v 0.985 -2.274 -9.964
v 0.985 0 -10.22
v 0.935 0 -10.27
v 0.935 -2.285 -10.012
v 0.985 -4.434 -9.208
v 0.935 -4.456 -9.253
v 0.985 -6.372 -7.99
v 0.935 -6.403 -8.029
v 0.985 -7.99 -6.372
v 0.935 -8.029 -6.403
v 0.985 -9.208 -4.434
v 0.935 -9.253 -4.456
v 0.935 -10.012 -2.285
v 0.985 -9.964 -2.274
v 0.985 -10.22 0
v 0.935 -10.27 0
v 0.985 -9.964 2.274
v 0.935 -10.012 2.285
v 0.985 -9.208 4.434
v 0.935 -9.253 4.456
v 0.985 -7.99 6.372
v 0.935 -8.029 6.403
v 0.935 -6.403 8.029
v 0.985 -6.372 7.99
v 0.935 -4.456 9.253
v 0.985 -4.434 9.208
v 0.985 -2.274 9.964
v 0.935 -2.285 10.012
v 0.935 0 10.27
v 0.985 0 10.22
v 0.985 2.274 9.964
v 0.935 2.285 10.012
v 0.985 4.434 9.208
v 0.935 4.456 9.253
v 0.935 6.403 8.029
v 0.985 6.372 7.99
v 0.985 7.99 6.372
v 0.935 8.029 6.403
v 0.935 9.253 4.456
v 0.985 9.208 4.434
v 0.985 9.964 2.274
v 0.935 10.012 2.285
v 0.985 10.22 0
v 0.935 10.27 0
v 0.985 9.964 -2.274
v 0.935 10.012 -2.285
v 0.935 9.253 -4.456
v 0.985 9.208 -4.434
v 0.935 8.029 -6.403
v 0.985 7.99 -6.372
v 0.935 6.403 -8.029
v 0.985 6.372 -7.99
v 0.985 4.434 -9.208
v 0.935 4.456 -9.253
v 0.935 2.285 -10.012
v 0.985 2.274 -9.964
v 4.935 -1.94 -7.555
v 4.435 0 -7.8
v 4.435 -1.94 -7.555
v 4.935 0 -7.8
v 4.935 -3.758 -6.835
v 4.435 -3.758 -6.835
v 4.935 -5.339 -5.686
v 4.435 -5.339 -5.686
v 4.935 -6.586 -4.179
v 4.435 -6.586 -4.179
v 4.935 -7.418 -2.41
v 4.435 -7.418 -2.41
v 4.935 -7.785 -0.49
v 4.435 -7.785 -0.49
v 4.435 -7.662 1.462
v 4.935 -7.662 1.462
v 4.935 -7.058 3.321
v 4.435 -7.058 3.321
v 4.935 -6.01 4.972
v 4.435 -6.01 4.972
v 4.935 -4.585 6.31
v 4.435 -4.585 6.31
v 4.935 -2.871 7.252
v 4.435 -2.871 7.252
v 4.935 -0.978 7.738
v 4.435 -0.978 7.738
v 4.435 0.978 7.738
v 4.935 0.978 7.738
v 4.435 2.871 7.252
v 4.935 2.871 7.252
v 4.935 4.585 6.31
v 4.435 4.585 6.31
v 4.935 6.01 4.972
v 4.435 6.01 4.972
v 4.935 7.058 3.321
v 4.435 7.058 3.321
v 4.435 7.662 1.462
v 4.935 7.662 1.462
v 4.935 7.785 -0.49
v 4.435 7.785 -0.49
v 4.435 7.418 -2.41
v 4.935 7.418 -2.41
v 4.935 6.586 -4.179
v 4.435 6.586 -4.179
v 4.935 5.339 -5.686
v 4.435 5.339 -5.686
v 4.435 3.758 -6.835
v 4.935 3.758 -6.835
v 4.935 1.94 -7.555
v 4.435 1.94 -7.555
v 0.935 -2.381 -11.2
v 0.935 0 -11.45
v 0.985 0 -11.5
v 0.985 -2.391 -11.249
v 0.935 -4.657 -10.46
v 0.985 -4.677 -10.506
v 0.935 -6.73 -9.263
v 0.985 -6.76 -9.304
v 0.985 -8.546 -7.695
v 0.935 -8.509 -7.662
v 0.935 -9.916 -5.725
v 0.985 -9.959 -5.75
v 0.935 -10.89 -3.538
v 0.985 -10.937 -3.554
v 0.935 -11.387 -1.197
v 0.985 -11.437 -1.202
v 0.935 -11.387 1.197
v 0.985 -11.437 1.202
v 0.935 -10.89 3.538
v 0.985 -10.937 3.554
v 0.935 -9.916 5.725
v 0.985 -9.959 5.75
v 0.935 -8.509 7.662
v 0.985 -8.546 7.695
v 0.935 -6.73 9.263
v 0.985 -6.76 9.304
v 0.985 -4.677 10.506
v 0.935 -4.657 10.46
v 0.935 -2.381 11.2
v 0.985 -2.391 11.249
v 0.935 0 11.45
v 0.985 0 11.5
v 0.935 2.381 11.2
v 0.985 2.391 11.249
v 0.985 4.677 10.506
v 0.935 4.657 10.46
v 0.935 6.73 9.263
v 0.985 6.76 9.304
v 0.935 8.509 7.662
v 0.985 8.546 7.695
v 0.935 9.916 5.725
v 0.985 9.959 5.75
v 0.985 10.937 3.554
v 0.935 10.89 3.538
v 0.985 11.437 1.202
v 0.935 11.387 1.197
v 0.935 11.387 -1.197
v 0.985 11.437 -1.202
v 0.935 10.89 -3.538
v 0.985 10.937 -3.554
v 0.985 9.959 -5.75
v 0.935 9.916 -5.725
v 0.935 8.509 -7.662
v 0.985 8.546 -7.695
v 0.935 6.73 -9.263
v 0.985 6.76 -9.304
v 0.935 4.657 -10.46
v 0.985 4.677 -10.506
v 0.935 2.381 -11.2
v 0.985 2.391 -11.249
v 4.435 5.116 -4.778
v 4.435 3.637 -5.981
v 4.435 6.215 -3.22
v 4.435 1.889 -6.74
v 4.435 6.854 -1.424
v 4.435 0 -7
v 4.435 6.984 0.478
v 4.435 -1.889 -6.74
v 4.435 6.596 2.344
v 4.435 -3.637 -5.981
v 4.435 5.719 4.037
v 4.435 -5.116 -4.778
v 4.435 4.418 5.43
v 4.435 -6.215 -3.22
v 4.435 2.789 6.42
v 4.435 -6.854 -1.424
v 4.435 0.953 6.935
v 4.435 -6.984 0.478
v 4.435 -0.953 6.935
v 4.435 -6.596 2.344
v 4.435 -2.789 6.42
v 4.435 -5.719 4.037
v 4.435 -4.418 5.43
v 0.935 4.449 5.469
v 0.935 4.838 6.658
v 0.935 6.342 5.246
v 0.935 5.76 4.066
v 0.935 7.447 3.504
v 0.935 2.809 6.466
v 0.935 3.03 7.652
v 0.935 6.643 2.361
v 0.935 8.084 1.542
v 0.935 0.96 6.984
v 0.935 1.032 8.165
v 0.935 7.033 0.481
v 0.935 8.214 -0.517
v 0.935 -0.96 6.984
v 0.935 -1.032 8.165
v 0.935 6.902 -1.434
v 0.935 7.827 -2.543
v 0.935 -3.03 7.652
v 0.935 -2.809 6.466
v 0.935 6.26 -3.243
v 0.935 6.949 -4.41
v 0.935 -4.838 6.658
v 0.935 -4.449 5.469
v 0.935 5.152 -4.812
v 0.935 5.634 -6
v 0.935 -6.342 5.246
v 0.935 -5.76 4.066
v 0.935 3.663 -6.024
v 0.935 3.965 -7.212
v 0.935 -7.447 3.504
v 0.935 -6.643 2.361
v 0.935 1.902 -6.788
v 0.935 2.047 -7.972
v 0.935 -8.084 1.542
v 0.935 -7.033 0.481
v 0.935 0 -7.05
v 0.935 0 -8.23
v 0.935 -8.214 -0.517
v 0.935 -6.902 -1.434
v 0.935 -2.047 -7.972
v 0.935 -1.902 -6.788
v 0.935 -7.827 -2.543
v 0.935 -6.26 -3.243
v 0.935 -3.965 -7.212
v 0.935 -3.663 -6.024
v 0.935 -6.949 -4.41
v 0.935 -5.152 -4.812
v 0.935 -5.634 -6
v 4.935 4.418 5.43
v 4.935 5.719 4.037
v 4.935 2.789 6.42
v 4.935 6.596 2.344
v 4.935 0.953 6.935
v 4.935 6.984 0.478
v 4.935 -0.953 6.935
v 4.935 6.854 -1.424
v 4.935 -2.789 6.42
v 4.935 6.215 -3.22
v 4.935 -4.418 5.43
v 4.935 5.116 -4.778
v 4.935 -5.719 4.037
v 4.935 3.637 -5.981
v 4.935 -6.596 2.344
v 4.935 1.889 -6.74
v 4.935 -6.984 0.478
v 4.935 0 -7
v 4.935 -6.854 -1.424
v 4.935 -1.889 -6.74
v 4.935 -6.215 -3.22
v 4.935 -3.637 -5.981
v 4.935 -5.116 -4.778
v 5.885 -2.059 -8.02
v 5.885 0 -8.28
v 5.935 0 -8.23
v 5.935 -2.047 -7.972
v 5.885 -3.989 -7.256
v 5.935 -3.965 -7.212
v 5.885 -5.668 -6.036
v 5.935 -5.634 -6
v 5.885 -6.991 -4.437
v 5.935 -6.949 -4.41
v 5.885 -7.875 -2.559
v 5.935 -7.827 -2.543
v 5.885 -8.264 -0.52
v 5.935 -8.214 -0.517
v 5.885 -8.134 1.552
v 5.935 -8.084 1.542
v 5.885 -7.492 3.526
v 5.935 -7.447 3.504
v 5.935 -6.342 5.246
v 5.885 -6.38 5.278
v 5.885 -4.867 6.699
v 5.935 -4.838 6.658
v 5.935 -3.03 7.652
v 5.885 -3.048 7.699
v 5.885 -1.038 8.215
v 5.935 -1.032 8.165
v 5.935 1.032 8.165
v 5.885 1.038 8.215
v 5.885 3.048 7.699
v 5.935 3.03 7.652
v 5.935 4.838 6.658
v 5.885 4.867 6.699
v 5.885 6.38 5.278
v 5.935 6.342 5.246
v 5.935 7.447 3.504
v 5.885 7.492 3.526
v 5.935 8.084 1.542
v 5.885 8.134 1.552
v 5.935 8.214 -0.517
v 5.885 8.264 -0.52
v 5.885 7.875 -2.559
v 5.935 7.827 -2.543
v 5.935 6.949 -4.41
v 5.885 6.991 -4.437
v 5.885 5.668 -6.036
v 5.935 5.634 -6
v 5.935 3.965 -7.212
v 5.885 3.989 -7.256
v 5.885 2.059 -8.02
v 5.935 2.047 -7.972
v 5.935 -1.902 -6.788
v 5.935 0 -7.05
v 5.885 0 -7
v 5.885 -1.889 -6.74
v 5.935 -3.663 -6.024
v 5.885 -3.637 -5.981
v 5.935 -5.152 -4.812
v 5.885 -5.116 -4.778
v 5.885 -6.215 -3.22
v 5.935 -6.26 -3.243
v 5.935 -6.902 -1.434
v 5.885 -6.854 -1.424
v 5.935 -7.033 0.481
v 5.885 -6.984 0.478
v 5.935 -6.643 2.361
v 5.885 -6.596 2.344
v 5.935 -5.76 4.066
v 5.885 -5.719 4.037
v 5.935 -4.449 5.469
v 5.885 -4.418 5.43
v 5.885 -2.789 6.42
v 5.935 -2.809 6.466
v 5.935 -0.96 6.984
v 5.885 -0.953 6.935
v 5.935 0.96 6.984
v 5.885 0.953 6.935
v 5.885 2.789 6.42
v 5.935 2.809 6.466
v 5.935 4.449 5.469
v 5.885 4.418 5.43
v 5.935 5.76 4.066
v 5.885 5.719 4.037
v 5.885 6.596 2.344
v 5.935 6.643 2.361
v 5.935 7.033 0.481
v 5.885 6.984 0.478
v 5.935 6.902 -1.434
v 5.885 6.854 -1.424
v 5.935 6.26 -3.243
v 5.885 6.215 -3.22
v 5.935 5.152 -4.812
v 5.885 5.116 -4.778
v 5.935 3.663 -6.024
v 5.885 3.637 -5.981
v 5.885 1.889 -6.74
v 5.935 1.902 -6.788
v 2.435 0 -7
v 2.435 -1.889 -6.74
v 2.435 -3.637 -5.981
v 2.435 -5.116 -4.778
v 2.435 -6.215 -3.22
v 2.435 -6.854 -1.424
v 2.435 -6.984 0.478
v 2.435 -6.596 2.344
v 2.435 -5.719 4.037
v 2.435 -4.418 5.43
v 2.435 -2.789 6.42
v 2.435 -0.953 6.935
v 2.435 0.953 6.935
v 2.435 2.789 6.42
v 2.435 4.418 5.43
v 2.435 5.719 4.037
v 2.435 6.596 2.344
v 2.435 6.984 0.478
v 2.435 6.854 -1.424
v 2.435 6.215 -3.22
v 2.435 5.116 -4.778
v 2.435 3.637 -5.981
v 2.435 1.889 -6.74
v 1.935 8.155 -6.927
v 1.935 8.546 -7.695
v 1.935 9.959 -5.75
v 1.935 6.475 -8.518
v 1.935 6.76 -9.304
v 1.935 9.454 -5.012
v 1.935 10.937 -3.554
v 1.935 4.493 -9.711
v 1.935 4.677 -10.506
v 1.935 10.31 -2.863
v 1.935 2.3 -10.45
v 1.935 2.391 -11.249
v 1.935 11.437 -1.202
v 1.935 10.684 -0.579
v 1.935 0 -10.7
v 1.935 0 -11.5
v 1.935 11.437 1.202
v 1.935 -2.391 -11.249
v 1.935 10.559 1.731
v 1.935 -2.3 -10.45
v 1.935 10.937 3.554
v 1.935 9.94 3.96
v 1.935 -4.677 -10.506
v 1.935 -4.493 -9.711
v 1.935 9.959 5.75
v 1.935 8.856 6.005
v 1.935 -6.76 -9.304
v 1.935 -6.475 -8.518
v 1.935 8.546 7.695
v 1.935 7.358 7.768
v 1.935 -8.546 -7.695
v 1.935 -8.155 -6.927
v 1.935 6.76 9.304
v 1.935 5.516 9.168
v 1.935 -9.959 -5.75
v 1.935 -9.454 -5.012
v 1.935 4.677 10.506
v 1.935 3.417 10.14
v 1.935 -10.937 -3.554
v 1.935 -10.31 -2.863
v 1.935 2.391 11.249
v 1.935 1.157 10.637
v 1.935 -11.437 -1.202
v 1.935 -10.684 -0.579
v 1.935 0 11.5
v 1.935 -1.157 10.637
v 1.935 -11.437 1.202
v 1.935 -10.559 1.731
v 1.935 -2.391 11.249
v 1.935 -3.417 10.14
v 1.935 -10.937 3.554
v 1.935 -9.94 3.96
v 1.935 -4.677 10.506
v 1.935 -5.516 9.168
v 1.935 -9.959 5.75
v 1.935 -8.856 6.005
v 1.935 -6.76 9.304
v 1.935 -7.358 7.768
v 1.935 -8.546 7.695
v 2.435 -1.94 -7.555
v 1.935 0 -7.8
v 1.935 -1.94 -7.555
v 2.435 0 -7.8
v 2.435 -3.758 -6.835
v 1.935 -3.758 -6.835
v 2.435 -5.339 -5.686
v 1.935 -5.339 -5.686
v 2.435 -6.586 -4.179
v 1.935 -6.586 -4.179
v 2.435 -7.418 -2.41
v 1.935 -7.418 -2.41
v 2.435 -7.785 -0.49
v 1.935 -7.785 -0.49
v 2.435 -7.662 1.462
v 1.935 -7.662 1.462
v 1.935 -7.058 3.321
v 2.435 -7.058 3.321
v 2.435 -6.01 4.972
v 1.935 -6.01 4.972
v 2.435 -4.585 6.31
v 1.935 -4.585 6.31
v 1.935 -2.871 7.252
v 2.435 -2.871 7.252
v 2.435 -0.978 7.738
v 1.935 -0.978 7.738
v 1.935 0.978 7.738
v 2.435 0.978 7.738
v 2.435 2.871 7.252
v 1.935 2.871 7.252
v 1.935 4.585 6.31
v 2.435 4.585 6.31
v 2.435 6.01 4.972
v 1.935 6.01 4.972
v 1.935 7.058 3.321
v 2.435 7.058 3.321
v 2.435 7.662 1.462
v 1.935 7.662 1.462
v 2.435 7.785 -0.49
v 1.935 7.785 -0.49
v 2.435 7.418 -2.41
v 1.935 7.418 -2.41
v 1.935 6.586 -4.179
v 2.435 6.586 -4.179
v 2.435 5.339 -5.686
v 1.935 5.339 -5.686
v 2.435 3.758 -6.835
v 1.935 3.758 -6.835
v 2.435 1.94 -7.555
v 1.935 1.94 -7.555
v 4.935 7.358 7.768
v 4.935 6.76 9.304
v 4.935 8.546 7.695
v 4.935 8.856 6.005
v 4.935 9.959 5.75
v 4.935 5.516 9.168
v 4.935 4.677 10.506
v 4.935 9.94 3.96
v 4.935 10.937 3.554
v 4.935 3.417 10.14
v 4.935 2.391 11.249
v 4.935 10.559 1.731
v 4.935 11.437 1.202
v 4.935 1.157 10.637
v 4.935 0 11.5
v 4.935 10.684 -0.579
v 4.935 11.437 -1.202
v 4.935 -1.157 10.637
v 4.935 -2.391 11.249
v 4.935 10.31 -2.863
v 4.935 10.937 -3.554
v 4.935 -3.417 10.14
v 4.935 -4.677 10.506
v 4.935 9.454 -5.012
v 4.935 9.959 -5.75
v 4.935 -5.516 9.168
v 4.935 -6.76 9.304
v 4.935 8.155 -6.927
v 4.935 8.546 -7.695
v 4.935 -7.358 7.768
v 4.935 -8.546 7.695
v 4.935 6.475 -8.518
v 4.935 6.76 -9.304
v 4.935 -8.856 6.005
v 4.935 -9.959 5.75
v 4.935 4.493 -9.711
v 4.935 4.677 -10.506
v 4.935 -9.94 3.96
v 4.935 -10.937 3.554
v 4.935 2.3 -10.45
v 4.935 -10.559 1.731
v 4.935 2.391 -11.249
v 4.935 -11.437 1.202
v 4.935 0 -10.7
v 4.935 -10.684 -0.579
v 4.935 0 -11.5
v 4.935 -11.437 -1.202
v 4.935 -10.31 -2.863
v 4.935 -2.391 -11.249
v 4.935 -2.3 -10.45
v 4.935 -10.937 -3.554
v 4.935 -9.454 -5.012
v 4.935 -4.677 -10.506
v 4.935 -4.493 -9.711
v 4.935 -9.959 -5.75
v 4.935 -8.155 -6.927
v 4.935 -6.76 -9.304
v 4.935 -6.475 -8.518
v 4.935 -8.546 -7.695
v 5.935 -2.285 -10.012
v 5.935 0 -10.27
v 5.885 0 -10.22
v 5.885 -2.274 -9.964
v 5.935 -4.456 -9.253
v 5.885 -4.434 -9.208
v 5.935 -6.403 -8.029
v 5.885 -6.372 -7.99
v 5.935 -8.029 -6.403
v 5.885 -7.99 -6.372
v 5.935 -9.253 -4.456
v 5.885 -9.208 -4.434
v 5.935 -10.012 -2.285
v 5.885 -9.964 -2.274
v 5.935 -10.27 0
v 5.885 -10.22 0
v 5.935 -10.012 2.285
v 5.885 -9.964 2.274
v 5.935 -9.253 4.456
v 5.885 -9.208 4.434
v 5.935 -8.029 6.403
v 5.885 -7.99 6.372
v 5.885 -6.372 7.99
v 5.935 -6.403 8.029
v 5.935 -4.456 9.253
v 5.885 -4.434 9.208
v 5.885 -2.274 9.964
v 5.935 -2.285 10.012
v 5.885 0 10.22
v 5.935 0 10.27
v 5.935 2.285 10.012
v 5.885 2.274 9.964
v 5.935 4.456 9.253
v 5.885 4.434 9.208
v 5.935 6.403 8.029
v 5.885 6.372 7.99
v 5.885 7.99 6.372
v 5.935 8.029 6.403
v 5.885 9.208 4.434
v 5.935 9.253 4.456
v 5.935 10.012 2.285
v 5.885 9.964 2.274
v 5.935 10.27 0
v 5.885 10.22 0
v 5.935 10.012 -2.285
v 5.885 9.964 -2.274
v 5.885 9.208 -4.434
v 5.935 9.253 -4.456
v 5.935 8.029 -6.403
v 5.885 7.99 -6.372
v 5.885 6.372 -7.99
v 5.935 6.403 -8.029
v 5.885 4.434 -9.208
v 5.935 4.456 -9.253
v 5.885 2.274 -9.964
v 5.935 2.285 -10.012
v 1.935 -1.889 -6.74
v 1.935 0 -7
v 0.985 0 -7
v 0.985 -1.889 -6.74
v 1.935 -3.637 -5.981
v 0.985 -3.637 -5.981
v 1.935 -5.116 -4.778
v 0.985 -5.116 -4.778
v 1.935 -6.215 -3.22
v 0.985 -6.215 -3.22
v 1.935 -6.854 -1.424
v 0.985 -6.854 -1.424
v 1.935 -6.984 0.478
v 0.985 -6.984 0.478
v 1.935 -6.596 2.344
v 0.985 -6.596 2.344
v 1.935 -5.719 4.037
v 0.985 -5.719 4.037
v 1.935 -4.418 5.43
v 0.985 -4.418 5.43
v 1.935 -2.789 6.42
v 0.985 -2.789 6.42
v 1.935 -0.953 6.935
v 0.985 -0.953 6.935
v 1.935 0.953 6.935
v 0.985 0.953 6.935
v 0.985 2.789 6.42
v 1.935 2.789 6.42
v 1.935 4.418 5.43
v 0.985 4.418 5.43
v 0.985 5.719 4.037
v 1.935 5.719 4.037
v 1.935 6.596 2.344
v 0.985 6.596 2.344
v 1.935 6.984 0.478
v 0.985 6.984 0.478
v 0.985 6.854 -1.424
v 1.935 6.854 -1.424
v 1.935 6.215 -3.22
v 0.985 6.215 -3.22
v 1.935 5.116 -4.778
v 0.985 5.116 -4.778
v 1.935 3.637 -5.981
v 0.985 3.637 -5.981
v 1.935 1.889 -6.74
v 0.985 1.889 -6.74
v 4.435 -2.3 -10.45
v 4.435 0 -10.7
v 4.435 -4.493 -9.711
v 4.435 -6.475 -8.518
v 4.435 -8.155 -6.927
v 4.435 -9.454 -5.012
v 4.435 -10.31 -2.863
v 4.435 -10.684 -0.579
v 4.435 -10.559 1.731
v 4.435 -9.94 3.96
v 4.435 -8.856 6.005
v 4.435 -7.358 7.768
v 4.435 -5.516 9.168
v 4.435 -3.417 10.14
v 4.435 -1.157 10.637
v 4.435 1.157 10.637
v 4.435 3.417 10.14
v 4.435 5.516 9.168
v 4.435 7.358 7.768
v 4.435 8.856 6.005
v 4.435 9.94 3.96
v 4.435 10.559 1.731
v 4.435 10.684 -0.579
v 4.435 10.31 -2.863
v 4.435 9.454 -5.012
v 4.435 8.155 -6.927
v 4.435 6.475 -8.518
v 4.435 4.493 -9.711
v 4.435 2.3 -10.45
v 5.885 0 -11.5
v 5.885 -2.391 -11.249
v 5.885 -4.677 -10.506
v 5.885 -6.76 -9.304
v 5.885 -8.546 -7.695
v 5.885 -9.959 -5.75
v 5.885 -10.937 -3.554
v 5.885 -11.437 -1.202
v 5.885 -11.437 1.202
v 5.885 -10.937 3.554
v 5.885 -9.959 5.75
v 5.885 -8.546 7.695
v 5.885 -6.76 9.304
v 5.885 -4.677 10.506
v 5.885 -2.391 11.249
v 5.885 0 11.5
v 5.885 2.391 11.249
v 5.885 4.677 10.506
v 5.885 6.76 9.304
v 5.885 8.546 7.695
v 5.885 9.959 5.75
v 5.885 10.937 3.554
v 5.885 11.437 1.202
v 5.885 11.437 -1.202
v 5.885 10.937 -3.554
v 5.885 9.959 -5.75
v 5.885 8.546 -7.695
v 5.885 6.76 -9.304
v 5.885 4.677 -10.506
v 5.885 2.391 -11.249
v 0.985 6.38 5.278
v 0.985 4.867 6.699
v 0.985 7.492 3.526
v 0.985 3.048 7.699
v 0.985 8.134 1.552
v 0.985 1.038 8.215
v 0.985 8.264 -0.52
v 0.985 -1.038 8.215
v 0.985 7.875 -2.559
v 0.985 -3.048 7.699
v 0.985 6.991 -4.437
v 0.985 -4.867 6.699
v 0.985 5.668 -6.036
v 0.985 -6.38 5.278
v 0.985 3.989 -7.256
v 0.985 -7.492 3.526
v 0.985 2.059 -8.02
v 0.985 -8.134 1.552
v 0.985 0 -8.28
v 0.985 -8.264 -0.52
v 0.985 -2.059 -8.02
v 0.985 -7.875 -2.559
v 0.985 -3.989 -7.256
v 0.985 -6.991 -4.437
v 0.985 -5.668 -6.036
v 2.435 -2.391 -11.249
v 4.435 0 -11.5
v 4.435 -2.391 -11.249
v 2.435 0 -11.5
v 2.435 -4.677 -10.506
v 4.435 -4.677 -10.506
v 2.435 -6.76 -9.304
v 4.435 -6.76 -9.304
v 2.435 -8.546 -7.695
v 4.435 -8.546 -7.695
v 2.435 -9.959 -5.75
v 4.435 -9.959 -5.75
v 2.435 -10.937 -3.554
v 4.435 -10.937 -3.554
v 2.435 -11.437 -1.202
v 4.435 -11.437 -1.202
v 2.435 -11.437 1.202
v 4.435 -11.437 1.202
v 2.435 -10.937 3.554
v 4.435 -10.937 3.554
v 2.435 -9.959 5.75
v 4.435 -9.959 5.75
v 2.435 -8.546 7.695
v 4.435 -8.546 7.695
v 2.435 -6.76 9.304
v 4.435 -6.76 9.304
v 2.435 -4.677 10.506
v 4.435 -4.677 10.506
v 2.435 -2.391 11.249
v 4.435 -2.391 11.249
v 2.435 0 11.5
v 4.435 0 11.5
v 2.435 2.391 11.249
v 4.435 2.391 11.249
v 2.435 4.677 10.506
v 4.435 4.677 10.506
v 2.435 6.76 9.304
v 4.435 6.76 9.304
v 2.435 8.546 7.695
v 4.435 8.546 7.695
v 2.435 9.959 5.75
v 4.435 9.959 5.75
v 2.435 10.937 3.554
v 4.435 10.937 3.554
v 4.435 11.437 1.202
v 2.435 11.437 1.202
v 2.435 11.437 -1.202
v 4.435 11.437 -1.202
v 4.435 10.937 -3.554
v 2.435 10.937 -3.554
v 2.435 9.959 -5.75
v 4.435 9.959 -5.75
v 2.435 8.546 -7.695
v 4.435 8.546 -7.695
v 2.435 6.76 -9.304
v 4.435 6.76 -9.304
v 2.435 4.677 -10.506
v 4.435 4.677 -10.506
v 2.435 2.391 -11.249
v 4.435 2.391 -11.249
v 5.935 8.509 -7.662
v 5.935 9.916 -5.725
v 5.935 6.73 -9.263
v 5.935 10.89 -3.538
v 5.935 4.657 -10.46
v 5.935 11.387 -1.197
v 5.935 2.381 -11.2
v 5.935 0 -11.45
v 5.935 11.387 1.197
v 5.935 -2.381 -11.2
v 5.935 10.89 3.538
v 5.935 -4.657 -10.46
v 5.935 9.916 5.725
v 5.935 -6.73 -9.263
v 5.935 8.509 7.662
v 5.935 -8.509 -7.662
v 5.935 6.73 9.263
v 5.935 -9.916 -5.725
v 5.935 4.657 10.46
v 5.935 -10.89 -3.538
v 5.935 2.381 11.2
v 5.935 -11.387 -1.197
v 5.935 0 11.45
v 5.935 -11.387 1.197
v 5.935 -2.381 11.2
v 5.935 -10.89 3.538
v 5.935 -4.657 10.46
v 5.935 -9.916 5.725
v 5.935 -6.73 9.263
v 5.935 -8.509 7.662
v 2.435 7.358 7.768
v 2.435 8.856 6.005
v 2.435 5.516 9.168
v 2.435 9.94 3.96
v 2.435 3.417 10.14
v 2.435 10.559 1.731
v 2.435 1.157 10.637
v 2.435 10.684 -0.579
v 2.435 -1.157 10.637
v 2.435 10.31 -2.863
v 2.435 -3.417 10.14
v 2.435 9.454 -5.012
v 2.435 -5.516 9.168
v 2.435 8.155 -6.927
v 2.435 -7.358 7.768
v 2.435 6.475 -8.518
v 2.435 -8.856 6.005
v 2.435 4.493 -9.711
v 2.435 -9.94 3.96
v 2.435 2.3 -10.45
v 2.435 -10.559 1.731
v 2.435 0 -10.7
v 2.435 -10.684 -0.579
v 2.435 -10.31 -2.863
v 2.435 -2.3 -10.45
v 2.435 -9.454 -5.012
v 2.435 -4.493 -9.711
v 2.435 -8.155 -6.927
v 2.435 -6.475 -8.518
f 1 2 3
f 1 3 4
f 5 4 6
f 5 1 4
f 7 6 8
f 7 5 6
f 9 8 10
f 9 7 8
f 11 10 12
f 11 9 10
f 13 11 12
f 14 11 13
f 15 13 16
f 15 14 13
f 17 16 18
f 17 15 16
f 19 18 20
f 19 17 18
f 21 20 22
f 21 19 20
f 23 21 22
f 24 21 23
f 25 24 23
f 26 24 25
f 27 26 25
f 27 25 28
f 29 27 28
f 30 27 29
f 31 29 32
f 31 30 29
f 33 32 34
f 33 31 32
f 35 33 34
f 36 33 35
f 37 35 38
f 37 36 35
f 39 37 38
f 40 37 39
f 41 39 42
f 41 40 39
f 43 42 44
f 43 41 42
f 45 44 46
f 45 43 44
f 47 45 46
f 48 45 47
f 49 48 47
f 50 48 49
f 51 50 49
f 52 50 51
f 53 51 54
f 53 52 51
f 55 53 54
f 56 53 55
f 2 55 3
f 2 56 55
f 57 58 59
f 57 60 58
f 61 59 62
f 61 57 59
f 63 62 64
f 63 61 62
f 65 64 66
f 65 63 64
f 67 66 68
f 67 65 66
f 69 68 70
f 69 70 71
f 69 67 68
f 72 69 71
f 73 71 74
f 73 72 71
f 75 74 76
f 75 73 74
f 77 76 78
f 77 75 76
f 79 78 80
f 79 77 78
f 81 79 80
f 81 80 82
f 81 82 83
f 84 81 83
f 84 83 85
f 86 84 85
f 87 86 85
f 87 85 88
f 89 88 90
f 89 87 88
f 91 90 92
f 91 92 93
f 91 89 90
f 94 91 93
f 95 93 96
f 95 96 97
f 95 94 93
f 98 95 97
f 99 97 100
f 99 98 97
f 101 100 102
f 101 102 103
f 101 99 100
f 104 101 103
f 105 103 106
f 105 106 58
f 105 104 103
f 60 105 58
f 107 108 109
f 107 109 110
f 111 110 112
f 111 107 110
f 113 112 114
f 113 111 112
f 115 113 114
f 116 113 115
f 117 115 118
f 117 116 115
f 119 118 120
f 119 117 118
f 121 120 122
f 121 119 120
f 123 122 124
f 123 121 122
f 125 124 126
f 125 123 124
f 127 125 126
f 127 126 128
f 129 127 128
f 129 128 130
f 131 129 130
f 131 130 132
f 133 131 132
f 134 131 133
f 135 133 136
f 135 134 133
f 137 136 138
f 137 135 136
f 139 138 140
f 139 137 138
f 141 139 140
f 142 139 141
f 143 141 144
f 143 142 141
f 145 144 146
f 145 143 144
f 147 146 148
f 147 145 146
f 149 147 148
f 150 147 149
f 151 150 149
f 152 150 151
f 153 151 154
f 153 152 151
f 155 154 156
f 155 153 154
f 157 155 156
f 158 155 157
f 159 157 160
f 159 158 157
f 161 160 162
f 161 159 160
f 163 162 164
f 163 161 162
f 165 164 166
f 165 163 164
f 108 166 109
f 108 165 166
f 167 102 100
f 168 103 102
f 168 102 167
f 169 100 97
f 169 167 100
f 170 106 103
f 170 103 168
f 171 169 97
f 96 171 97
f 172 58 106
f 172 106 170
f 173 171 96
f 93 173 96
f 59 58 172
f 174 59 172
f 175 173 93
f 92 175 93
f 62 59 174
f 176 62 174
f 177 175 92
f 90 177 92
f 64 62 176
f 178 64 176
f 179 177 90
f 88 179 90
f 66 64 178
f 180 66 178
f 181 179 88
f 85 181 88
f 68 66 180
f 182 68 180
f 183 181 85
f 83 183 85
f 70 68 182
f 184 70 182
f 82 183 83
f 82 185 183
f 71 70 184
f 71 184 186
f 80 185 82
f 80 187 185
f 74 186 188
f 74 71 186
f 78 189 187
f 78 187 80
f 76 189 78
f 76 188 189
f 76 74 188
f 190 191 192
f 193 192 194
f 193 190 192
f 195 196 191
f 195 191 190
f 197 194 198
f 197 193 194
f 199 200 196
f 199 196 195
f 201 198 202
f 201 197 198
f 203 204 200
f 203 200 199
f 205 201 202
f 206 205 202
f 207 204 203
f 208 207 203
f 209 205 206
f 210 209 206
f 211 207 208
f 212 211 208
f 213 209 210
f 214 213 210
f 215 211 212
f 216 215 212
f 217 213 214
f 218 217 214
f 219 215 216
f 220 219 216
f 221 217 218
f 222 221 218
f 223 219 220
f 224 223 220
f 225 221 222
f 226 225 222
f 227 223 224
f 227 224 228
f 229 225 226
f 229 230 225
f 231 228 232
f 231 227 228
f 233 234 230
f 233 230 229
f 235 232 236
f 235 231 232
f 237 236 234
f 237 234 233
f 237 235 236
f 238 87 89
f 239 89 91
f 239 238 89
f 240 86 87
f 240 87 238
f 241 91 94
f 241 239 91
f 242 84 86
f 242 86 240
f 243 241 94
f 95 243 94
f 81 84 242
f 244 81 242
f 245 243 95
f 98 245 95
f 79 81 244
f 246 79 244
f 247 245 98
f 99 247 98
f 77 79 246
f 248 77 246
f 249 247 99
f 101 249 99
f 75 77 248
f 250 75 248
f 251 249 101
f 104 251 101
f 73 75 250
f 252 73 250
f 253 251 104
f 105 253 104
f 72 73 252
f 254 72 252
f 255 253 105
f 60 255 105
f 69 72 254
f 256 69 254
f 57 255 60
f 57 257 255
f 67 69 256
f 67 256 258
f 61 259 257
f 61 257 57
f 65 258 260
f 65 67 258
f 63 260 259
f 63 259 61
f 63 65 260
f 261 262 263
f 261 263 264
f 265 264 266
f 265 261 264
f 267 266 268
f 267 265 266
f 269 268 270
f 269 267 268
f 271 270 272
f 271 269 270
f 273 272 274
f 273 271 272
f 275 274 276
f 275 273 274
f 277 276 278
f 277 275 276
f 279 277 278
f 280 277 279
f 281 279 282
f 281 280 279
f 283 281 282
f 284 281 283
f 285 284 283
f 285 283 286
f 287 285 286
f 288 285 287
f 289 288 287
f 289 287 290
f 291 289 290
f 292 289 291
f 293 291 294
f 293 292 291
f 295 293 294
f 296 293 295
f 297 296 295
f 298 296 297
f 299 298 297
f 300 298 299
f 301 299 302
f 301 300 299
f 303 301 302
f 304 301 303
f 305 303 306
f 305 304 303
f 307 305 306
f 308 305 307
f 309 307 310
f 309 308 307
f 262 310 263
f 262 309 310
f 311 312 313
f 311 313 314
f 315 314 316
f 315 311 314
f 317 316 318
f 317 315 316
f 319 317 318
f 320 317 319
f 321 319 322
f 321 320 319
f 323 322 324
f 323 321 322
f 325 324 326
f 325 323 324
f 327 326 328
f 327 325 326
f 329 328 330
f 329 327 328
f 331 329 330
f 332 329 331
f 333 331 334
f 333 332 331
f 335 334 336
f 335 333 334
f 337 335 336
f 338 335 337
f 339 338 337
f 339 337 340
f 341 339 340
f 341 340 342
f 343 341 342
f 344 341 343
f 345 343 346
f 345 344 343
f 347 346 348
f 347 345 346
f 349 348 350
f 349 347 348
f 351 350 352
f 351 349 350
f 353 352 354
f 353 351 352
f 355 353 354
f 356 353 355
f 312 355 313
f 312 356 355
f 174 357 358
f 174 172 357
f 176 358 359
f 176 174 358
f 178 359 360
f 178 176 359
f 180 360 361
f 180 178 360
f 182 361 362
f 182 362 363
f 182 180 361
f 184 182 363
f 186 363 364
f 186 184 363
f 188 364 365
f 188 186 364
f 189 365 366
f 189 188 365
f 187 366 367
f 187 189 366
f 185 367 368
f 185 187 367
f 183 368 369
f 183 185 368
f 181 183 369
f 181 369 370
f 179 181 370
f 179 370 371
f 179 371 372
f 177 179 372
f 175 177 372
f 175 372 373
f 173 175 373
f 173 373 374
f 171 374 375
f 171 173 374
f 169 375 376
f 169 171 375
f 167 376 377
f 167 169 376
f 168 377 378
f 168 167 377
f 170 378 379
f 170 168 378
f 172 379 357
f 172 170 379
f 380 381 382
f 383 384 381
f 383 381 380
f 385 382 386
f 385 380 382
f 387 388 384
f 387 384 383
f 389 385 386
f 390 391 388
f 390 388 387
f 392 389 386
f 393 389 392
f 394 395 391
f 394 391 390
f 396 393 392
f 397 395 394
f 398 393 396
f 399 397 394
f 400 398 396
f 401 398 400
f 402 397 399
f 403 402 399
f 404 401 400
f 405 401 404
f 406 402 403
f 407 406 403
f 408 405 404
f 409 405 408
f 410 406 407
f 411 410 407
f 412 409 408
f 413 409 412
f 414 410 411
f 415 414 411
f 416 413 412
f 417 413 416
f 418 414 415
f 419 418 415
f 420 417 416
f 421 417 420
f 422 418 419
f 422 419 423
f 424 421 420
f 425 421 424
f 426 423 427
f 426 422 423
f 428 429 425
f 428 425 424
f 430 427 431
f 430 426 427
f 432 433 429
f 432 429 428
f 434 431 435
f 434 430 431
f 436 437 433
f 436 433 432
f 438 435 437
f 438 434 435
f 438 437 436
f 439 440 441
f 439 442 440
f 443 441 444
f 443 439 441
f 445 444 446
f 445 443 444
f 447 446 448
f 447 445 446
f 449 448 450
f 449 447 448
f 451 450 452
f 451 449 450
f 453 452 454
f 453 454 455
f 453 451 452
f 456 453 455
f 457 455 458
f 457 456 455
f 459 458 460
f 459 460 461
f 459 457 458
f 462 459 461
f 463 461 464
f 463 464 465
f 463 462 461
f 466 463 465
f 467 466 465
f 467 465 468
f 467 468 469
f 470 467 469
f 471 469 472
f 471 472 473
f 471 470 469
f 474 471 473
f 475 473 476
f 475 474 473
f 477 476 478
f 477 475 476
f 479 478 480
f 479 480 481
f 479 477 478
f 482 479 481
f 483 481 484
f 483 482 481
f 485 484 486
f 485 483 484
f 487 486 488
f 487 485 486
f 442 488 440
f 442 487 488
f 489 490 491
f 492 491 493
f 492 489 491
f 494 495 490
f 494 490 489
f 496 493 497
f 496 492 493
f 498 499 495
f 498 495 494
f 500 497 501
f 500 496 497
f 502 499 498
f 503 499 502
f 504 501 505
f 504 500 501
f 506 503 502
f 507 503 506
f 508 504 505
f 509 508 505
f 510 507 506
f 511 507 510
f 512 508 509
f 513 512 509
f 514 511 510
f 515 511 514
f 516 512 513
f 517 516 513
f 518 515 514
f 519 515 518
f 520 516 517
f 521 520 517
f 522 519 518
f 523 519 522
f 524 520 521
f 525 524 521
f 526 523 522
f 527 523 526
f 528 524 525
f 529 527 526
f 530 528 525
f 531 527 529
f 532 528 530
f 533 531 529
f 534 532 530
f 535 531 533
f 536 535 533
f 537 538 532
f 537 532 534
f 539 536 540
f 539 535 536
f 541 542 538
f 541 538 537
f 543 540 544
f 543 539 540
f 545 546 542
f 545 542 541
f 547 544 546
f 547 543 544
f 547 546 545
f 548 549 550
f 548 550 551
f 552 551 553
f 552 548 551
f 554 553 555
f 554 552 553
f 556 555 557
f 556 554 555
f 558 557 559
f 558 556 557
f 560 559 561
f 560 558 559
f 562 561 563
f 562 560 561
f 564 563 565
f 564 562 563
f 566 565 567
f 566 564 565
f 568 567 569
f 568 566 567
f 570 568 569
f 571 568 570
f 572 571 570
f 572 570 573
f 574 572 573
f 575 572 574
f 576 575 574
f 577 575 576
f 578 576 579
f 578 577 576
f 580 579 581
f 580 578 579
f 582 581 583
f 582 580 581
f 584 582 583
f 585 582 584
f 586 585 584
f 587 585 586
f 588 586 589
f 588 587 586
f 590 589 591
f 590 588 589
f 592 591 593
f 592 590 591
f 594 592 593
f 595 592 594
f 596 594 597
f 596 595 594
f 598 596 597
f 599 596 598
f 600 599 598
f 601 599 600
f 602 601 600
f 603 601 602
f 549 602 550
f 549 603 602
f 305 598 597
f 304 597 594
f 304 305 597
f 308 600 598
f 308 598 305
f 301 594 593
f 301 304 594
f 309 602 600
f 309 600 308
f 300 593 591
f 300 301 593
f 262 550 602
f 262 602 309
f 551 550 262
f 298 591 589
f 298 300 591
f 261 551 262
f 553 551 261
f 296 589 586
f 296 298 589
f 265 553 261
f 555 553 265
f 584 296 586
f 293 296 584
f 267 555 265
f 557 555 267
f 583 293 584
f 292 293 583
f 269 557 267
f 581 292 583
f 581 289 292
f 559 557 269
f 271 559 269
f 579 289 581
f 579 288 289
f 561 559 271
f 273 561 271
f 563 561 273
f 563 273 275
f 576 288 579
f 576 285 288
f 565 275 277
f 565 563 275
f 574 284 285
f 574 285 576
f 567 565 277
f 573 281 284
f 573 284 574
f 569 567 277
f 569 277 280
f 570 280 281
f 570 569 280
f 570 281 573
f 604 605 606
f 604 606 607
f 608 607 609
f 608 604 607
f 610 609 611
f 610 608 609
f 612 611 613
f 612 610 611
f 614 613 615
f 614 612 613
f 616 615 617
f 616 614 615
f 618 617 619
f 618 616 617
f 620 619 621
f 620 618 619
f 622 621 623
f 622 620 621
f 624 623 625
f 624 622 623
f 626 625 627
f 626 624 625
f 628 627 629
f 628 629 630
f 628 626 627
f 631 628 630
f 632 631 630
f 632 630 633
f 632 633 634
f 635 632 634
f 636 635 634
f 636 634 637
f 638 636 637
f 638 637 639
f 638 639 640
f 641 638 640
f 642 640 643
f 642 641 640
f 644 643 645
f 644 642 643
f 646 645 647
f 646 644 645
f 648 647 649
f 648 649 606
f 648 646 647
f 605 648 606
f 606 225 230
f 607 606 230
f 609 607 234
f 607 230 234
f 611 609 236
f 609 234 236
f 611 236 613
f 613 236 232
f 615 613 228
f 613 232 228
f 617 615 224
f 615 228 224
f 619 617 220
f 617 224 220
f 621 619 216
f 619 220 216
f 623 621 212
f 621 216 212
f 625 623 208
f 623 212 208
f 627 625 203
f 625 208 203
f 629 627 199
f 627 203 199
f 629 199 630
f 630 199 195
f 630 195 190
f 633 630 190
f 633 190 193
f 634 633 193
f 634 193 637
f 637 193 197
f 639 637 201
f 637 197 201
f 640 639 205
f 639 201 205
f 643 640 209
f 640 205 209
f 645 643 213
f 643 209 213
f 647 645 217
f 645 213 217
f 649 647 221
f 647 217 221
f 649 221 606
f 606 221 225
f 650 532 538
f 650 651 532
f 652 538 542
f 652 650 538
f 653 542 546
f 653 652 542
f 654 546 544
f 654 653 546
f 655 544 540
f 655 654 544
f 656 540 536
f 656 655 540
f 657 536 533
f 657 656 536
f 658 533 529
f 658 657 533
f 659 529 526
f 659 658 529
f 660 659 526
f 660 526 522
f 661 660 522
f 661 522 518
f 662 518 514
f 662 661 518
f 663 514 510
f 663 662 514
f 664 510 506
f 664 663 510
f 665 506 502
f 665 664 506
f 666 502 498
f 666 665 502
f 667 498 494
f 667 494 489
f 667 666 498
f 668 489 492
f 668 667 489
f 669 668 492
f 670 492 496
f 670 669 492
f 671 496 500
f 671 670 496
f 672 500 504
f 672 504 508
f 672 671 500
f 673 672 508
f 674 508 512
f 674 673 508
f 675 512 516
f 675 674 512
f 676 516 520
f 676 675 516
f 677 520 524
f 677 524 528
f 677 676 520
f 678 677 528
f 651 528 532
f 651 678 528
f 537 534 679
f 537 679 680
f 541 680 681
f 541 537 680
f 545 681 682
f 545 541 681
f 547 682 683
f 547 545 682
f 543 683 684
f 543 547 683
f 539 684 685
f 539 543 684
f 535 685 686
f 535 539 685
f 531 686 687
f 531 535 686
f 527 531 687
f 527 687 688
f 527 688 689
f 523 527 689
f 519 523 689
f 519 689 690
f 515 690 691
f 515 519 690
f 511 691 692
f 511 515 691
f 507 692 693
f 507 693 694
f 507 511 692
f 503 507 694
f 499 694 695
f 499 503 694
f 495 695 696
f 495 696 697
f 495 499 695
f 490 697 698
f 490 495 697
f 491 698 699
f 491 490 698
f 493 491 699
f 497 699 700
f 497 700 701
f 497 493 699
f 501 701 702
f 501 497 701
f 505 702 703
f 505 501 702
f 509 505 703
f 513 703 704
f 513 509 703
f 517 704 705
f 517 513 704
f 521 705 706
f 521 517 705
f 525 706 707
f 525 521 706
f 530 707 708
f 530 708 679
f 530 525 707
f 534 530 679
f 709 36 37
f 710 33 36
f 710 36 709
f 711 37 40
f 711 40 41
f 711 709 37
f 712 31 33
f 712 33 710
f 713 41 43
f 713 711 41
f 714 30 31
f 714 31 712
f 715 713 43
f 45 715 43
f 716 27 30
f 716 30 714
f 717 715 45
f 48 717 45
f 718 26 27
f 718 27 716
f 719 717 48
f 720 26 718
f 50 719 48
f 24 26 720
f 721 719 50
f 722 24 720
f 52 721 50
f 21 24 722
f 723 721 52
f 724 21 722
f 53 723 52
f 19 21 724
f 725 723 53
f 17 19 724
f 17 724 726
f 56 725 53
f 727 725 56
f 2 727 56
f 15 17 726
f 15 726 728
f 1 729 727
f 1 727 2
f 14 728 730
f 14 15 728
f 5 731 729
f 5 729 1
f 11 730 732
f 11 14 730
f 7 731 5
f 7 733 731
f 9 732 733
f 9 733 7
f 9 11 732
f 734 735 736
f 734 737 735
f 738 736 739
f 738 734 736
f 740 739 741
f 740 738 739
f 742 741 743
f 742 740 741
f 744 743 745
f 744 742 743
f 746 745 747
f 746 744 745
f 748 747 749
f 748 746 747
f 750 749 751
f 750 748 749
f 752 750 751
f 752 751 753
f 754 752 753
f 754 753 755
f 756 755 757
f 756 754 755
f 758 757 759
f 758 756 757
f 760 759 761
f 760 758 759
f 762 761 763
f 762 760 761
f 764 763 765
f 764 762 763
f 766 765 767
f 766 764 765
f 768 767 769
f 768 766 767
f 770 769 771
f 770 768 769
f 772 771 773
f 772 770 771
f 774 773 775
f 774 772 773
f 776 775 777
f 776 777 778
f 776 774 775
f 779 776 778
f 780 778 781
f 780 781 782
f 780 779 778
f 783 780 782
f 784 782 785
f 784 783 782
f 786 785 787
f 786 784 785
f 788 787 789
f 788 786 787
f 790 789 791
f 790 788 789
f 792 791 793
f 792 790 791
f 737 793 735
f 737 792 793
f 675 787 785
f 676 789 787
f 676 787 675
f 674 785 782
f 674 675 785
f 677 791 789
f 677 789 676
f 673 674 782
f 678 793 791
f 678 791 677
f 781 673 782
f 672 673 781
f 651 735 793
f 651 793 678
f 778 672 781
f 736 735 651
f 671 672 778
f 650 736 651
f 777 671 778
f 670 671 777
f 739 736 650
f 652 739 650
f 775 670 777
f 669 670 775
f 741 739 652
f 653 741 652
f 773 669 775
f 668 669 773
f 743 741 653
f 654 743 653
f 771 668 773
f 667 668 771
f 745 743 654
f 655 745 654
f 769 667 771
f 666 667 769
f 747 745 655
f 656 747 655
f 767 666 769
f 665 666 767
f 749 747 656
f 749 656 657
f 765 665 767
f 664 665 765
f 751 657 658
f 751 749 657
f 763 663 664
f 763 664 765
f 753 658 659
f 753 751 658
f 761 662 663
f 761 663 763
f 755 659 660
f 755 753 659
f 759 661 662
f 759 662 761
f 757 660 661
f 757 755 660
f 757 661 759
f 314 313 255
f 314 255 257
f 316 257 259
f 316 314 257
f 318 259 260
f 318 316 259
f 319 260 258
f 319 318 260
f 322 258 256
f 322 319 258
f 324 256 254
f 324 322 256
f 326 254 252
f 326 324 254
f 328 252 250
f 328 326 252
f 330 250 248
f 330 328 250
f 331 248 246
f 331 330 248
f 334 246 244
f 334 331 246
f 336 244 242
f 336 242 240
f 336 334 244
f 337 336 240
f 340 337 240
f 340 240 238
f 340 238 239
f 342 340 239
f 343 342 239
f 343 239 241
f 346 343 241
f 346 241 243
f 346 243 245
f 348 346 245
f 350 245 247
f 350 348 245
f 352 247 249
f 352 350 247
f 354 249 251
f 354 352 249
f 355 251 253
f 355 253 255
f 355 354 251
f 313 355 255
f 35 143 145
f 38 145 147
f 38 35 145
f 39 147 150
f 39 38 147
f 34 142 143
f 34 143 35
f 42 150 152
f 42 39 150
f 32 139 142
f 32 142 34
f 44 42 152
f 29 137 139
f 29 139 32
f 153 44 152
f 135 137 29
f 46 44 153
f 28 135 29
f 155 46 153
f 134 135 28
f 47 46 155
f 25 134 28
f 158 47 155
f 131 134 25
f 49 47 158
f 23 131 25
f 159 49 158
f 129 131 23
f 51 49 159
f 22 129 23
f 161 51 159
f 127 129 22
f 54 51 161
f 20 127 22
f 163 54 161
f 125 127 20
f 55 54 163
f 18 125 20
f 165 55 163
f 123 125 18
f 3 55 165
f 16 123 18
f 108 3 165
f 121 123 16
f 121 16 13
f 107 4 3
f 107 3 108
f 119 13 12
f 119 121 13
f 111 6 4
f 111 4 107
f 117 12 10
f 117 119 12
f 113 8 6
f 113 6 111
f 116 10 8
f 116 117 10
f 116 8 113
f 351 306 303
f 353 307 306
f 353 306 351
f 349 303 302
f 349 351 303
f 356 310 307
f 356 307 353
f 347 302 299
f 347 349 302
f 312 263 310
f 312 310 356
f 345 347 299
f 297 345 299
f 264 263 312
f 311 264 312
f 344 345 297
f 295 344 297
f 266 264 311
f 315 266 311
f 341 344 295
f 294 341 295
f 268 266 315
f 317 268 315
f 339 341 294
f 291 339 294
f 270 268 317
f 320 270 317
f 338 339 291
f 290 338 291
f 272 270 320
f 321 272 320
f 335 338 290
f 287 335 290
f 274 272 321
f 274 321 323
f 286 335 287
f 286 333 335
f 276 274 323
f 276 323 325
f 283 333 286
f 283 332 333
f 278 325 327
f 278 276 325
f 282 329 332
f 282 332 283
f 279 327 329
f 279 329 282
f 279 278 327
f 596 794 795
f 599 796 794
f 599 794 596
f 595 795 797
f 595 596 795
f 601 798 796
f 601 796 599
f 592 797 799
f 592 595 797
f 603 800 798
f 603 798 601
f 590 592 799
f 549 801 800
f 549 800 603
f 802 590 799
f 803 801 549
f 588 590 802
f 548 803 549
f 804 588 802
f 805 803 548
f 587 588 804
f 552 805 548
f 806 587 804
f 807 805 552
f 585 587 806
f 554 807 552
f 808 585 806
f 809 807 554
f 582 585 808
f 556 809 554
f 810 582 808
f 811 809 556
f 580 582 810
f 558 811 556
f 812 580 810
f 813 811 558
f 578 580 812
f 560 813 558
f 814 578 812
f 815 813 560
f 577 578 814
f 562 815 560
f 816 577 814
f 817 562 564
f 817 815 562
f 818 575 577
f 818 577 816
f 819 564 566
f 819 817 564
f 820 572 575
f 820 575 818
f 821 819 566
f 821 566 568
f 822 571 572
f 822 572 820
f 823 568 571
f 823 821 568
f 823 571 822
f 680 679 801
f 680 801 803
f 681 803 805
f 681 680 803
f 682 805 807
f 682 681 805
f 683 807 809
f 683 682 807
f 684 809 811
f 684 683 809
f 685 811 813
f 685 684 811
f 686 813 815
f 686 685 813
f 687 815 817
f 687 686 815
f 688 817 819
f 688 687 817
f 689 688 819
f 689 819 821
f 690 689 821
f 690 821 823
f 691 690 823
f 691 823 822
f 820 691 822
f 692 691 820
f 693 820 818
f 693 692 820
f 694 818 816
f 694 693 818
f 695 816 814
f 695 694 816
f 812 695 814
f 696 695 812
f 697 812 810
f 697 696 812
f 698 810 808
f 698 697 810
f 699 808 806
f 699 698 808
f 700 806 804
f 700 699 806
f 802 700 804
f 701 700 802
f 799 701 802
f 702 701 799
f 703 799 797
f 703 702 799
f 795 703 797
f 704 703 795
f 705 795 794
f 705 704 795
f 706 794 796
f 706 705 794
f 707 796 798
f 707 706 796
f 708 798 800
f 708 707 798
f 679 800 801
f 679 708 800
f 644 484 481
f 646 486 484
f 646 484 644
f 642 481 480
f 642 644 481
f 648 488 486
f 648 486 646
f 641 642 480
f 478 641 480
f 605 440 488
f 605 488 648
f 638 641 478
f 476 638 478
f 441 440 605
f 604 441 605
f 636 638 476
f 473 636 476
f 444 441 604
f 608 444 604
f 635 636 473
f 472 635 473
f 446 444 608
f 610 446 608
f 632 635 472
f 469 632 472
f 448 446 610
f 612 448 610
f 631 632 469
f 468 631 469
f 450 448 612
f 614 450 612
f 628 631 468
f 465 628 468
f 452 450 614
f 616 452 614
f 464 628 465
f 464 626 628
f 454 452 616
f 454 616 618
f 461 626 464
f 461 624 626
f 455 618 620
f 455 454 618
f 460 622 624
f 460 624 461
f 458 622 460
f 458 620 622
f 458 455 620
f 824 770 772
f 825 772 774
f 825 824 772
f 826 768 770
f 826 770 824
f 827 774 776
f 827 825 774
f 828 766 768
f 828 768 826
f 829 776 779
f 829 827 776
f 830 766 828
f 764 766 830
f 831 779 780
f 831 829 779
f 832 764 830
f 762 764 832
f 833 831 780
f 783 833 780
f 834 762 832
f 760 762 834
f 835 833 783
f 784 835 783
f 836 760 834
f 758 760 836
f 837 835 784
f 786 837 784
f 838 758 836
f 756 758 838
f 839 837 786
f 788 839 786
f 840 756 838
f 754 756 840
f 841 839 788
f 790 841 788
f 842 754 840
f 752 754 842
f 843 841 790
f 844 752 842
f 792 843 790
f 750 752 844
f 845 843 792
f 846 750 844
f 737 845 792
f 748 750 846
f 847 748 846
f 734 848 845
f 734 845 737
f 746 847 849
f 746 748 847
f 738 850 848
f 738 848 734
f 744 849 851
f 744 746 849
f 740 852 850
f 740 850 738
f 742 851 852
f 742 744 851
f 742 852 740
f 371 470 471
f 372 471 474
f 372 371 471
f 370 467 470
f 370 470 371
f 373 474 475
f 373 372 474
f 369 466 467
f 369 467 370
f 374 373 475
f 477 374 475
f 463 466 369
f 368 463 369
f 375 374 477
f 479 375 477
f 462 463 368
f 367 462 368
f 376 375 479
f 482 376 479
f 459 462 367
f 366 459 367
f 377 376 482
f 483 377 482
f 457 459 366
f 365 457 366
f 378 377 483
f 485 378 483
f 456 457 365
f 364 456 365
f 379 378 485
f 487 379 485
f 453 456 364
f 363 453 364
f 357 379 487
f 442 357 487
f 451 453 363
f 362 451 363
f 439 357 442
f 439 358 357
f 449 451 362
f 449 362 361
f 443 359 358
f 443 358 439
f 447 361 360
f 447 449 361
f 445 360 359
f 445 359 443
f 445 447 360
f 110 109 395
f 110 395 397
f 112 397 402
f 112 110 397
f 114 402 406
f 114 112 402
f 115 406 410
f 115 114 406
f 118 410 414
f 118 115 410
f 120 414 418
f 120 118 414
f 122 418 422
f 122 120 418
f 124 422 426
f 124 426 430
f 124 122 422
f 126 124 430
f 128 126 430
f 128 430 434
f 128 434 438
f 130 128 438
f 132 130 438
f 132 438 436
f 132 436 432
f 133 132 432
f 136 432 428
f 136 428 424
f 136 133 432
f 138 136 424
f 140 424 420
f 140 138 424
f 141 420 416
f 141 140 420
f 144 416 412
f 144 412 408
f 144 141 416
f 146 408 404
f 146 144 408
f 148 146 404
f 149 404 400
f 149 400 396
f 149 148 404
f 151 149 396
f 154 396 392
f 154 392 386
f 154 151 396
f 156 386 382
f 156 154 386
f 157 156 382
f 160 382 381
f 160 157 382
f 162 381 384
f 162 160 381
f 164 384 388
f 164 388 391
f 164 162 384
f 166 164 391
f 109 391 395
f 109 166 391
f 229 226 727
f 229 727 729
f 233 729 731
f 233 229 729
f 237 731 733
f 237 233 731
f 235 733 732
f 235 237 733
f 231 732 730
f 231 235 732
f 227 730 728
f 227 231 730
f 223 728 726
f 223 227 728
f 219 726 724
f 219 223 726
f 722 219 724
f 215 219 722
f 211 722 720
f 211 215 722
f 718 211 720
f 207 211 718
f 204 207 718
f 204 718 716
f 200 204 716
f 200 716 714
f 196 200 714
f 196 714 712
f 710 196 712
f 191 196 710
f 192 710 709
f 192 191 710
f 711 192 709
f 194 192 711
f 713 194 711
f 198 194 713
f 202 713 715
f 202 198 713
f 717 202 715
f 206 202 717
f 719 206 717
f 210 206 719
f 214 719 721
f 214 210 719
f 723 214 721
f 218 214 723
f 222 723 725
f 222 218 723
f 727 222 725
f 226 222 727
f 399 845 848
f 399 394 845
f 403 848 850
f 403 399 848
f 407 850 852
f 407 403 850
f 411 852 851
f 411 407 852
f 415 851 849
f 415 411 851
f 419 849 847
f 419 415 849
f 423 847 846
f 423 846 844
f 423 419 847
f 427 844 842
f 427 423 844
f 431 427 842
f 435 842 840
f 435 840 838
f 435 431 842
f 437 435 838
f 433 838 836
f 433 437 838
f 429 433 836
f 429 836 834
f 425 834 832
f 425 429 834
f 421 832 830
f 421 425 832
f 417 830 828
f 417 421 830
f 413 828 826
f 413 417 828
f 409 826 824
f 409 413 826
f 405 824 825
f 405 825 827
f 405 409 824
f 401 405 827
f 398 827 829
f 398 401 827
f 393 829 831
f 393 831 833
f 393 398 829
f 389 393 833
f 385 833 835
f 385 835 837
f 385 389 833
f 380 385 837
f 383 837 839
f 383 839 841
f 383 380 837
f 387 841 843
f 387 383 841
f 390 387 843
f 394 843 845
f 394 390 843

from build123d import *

# Parameters (mm, degrees)
SMUSSO1_SIZE = 0.05


with BuildPart() as part:
    # Schizzo1 → Rivoluzione1 (revolve)
    with BuildSketch(Plane.XY, mode=Mode.PRIVATE) as rivoluzione1_sk:
        Polygon((0.935183111, 7), (1.935183111, 7), (1.935183111, 7.8), (2.435183111, 7.8), (2.435183111, 7), (4.435183111, 7), (4.435183111, 7.8), (4.935183111, 7.8), (4.935183111, 7), (5.935183111, 7), (5.935183111, 8.280172414), (5.885183111, 8.280172414), (5.885183111, 10.219827586), (5.935183111, 10.219827586), (5.935183111, 11.5), (4.935183111, 11.5), (4.935183111, 10.7), (4.435183111, 10.7), (4.435183111, 11.5), (2.435183111, 11.5), (2.435183111, 10.7), (1.935183111, 10.7), (1.935183111, 11.5), (0.935183111, 11.5), (0.935183111, 10.219827586), (0.985183111, 10.219827586), (0.985183111, 8.280172414), (0.935183111, 8.280172414), align=None)
    revolve(rivoluzione1_sk.sketch.rotate(Axis((0, 0, 0), (-1, 0, 0)), 90), axis=Axis((0, 0, 0), (-1, 0, 0)))

    # Smusso1
    smusso1_edges = [part.edges().sort_by_distance(p)[0] for p in [
        (0.935183111, 0, 8.280172414),
        (0.935183111, 0, 10.219827586),
        (0.935183111, 0, 11.5),
        (5.935183111, 0, 11.5),
        (5.935183111, 0, 10.219827586),
        (5.935183111, 0, 8.280172414),
        (5.935183111, 0, 7),
        (0.935183111, 0, 7),
    ]]
    chamfer(smusso1_edges, length=SMUSSO1_SIZE - 0.0001)  # a hair under: the kernel refuses the full size


solid = part.part
